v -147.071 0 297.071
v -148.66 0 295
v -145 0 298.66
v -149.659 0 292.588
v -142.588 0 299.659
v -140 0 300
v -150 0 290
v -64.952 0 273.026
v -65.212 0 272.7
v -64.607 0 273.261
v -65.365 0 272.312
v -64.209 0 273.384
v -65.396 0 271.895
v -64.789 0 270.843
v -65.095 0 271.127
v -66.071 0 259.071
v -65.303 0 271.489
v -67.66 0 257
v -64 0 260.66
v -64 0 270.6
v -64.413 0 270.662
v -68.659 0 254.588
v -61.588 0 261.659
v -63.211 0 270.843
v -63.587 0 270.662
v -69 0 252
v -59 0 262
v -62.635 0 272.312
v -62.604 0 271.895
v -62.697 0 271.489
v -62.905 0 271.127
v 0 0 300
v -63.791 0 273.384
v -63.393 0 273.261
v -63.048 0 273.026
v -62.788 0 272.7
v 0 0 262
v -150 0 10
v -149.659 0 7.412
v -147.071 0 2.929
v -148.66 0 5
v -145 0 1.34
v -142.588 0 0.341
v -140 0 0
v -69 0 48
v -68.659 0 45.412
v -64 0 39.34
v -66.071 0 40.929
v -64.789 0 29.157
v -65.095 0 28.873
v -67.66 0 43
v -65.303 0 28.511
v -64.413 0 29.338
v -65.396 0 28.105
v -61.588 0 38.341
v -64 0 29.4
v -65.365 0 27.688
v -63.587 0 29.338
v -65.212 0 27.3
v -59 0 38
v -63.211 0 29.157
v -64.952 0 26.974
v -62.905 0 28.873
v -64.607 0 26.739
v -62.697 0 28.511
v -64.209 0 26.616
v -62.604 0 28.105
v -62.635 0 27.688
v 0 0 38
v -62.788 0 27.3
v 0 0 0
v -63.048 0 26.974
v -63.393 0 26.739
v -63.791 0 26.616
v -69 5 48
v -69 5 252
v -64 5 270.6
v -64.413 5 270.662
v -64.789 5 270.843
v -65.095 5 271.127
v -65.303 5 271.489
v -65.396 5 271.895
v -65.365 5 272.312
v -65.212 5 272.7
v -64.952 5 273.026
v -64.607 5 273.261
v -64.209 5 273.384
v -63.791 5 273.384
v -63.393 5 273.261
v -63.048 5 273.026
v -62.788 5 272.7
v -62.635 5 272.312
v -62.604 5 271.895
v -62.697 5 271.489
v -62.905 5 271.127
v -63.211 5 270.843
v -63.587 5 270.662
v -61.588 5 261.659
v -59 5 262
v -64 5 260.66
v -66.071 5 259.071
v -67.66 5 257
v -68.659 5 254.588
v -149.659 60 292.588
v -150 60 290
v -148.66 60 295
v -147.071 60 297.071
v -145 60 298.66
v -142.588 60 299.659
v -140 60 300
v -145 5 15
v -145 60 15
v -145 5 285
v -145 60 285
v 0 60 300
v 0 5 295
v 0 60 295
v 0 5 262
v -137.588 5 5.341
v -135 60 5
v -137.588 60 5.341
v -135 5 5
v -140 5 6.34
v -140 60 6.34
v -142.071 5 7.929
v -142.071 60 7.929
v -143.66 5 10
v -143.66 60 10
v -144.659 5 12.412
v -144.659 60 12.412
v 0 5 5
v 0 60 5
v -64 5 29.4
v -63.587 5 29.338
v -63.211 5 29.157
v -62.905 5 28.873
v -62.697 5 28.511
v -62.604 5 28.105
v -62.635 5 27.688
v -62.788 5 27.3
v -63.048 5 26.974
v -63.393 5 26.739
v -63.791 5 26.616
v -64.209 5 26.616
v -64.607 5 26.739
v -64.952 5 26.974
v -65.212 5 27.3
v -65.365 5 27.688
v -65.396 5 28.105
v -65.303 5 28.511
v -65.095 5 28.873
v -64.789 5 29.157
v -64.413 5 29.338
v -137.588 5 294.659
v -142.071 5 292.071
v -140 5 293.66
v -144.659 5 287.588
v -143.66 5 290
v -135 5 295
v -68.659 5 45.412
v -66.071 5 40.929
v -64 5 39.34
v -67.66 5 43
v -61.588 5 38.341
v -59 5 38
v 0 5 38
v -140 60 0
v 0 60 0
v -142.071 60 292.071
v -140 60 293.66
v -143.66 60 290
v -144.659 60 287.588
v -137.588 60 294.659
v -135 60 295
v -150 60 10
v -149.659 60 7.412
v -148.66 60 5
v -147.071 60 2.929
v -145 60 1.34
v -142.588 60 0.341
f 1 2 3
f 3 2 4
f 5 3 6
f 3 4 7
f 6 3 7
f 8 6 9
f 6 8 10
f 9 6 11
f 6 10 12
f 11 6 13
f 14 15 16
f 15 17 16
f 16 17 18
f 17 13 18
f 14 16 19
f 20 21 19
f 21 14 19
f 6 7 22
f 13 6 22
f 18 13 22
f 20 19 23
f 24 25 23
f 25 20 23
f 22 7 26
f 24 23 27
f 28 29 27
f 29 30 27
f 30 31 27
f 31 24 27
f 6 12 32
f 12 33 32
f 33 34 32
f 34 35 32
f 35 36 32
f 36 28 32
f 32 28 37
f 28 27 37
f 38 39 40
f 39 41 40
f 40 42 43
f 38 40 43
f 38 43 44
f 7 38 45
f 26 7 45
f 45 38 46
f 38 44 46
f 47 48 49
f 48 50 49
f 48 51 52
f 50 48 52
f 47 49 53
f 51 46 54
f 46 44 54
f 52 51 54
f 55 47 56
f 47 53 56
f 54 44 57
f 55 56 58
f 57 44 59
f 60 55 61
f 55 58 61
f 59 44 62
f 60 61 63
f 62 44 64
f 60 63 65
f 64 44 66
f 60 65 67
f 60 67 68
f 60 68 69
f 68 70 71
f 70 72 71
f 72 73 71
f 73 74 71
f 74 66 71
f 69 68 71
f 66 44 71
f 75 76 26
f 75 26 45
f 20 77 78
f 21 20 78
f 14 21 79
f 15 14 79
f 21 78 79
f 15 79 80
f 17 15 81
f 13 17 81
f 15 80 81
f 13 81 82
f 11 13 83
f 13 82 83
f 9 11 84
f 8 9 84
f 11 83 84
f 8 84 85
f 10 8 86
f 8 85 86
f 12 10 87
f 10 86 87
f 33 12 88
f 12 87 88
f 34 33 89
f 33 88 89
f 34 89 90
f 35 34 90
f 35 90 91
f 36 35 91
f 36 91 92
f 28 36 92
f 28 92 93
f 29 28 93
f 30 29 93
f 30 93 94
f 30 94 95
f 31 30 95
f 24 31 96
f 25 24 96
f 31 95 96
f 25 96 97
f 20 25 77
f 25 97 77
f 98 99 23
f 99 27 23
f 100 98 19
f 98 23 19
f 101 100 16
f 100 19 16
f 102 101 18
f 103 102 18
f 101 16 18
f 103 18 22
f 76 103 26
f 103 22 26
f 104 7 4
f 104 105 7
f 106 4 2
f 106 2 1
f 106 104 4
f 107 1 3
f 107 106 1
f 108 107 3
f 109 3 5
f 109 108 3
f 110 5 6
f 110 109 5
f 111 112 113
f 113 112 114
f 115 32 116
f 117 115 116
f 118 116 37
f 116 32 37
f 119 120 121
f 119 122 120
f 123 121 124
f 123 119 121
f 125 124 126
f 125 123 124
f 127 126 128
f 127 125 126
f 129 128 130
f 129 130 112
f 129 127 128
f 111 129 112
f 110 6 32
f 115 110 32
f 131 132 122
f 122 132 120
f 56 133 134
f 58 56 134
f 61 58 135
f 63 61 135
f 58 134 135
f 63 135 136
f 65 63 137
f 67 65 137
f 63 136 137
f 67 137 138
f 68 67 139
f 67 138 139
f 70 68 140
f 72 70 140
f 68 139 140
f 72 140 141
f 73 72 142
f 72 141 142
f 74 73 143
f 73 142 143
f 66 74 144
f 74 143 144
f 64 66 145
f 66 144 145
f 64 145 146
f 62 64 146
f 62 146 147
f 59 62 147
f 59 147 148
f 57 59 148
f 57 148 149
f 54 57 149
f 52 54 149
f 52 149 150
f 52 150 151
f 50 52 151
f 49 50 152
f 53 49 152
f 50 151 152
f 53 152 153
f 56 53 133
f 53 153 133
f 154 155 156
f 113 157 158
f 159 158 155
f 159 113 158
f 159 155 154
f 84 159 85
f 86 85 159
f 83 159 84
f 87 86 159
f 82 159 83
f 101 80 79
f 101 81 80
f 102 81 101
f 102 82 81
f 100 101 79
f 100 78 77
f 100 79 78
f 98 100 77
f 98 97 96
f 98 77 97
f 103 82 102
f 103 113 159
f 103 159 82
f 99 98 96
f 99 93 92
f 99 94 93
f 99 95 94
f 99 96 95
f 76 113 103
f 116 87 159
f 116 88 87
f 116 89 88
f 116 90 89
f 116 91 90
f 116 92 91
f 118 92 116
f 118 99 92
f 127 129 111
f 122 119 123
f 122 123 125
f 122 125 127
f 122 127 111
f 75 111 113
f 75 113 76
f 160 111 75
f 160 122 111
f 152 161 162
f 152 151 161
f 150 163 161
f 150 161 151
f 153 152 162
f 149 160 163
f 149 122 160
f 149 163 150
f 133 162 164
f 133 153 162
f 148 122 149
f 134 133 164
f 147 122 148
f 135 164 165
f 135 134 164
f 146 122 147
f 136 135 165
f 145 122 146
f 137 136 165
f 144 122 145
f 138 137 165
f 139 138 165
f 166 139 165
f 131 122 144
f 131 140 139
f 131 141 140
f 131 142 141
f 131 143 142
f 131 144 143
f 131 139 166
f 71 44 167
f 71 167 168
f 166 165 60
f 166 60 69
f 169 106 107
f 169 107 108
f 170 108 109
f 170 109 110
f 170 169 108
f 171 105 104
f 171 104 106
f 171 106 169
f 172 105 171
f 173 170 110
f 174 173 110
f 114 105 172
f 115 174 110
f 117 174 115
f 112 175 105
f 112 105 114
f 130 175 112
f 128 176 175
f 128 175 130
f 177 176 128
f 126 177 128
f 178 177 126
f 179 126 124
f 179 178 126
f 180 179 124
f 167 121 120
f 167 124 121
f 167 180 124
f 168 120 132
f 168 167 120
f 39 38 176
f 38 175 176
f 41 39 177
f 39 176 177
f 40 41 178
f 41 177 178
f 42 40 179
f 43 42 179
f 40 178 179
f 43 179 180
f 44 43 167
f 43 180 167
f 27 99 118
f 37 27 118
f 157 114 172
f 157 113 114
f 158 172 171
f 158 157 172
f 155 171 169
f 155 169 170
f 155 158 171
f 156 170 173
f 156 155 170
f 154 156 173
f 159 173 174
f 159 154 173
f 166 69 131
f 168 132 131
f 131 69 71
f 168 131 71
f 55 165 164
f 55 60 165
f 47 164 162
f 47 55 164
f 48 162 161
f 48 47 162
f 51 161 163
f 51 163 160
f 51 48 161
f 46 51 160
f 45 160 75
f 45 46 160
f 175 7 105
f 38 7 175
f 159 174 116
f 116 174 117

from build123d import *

# Parameters (mm, degrees)
SKETCH_1_W          = 150
SKETCH_1_H          = 300
EXTRUDE_1_DEPTH     = 60
CUT_EXTRUDE_1_DEPTH = 55
SKETCH_3_W          = 69
SKETCH_3_H          = 224
CUT_EXTRUDE_2_DEPTH = 5
SKETCH_4_R          = 1.4
CUT_EXTRUDE_3_DEPTH = 5
FILLET_1_R          = 10


with BuildPart() as part:
    # 草图1 → 凸台-拉伸1 (new body)
    with BuildSketch(Plane(origin=(0, 0, 0), x_dir=(1, 0, 0), z_dir=(0, 1, 0))):
        with Locations((-75, -150)):
            Rectangle(SKETCH_1_W, SKETCH_1_H)
    extrude(amount=EXTRUDE_1_DEPTH)

    # 草图2 → 切除-拉伸1 (cut)
    with BuildSketch(Plane(origin=(0, 60, 0), x_dir=(1, 0, 0), z_dir=(0, 1, 0))):
        Polygon((-5, -5), (-145, -5), (-145, -295), (-5, -295), (0, -295), (0, -5), align=None)
    extrude(amount=-CUT_EXTRUDE_1_DEPTH, mode=Mode.SUBTRACT)

    # 草图3 → 切除-拉伸2 (cut)
    with BuildSketch(Plane(origin=(0, 5, 0), x_dir=(1, 0, 0), z_dir=(0, 1, 0))):
        with Locations((-34.5, -150)):
            Rectangle(SKETCH_3_W, SKETCH_3_H)
    extrude(amount=-CUT_EXTRUDE_2_DEPTH, mode=Mode.SUBTRACT)

    # 草图4 → 切除-拉伸3 (cut)
    with BuildSketch(Plane(origin=(0, 5, 0), x_dir=(1, 0, 0), z_dir=(0, 1, 0))):
        with Locations(Location((-64, -28, 0), (0, 0, 270))):
            Circle(SKETCH_4_R)
        with Locations(Location((-64, -272, 0), (0, 0, 90))):
            Circle(SKETCH_4_R)
    extrude(amount=-CUT_EXTRUDE_3_DEPTH, mode=Mode.SUBTRACT)

    # 圆角1
    fillet_1_edges = [part.edges().sort_by_distance(p)[0] for p in [
        (-145, 32.5, 5),
        (-145, 32.5, 295),
        (-69, 2.5, 38),
        (-69, 2.5, 262),
        (-150, 30, 300),
        (-150, 30, 0),
    ]]
    fillet(fillet_1_edges, radius=FILLET_1_R)


solid = part.part
